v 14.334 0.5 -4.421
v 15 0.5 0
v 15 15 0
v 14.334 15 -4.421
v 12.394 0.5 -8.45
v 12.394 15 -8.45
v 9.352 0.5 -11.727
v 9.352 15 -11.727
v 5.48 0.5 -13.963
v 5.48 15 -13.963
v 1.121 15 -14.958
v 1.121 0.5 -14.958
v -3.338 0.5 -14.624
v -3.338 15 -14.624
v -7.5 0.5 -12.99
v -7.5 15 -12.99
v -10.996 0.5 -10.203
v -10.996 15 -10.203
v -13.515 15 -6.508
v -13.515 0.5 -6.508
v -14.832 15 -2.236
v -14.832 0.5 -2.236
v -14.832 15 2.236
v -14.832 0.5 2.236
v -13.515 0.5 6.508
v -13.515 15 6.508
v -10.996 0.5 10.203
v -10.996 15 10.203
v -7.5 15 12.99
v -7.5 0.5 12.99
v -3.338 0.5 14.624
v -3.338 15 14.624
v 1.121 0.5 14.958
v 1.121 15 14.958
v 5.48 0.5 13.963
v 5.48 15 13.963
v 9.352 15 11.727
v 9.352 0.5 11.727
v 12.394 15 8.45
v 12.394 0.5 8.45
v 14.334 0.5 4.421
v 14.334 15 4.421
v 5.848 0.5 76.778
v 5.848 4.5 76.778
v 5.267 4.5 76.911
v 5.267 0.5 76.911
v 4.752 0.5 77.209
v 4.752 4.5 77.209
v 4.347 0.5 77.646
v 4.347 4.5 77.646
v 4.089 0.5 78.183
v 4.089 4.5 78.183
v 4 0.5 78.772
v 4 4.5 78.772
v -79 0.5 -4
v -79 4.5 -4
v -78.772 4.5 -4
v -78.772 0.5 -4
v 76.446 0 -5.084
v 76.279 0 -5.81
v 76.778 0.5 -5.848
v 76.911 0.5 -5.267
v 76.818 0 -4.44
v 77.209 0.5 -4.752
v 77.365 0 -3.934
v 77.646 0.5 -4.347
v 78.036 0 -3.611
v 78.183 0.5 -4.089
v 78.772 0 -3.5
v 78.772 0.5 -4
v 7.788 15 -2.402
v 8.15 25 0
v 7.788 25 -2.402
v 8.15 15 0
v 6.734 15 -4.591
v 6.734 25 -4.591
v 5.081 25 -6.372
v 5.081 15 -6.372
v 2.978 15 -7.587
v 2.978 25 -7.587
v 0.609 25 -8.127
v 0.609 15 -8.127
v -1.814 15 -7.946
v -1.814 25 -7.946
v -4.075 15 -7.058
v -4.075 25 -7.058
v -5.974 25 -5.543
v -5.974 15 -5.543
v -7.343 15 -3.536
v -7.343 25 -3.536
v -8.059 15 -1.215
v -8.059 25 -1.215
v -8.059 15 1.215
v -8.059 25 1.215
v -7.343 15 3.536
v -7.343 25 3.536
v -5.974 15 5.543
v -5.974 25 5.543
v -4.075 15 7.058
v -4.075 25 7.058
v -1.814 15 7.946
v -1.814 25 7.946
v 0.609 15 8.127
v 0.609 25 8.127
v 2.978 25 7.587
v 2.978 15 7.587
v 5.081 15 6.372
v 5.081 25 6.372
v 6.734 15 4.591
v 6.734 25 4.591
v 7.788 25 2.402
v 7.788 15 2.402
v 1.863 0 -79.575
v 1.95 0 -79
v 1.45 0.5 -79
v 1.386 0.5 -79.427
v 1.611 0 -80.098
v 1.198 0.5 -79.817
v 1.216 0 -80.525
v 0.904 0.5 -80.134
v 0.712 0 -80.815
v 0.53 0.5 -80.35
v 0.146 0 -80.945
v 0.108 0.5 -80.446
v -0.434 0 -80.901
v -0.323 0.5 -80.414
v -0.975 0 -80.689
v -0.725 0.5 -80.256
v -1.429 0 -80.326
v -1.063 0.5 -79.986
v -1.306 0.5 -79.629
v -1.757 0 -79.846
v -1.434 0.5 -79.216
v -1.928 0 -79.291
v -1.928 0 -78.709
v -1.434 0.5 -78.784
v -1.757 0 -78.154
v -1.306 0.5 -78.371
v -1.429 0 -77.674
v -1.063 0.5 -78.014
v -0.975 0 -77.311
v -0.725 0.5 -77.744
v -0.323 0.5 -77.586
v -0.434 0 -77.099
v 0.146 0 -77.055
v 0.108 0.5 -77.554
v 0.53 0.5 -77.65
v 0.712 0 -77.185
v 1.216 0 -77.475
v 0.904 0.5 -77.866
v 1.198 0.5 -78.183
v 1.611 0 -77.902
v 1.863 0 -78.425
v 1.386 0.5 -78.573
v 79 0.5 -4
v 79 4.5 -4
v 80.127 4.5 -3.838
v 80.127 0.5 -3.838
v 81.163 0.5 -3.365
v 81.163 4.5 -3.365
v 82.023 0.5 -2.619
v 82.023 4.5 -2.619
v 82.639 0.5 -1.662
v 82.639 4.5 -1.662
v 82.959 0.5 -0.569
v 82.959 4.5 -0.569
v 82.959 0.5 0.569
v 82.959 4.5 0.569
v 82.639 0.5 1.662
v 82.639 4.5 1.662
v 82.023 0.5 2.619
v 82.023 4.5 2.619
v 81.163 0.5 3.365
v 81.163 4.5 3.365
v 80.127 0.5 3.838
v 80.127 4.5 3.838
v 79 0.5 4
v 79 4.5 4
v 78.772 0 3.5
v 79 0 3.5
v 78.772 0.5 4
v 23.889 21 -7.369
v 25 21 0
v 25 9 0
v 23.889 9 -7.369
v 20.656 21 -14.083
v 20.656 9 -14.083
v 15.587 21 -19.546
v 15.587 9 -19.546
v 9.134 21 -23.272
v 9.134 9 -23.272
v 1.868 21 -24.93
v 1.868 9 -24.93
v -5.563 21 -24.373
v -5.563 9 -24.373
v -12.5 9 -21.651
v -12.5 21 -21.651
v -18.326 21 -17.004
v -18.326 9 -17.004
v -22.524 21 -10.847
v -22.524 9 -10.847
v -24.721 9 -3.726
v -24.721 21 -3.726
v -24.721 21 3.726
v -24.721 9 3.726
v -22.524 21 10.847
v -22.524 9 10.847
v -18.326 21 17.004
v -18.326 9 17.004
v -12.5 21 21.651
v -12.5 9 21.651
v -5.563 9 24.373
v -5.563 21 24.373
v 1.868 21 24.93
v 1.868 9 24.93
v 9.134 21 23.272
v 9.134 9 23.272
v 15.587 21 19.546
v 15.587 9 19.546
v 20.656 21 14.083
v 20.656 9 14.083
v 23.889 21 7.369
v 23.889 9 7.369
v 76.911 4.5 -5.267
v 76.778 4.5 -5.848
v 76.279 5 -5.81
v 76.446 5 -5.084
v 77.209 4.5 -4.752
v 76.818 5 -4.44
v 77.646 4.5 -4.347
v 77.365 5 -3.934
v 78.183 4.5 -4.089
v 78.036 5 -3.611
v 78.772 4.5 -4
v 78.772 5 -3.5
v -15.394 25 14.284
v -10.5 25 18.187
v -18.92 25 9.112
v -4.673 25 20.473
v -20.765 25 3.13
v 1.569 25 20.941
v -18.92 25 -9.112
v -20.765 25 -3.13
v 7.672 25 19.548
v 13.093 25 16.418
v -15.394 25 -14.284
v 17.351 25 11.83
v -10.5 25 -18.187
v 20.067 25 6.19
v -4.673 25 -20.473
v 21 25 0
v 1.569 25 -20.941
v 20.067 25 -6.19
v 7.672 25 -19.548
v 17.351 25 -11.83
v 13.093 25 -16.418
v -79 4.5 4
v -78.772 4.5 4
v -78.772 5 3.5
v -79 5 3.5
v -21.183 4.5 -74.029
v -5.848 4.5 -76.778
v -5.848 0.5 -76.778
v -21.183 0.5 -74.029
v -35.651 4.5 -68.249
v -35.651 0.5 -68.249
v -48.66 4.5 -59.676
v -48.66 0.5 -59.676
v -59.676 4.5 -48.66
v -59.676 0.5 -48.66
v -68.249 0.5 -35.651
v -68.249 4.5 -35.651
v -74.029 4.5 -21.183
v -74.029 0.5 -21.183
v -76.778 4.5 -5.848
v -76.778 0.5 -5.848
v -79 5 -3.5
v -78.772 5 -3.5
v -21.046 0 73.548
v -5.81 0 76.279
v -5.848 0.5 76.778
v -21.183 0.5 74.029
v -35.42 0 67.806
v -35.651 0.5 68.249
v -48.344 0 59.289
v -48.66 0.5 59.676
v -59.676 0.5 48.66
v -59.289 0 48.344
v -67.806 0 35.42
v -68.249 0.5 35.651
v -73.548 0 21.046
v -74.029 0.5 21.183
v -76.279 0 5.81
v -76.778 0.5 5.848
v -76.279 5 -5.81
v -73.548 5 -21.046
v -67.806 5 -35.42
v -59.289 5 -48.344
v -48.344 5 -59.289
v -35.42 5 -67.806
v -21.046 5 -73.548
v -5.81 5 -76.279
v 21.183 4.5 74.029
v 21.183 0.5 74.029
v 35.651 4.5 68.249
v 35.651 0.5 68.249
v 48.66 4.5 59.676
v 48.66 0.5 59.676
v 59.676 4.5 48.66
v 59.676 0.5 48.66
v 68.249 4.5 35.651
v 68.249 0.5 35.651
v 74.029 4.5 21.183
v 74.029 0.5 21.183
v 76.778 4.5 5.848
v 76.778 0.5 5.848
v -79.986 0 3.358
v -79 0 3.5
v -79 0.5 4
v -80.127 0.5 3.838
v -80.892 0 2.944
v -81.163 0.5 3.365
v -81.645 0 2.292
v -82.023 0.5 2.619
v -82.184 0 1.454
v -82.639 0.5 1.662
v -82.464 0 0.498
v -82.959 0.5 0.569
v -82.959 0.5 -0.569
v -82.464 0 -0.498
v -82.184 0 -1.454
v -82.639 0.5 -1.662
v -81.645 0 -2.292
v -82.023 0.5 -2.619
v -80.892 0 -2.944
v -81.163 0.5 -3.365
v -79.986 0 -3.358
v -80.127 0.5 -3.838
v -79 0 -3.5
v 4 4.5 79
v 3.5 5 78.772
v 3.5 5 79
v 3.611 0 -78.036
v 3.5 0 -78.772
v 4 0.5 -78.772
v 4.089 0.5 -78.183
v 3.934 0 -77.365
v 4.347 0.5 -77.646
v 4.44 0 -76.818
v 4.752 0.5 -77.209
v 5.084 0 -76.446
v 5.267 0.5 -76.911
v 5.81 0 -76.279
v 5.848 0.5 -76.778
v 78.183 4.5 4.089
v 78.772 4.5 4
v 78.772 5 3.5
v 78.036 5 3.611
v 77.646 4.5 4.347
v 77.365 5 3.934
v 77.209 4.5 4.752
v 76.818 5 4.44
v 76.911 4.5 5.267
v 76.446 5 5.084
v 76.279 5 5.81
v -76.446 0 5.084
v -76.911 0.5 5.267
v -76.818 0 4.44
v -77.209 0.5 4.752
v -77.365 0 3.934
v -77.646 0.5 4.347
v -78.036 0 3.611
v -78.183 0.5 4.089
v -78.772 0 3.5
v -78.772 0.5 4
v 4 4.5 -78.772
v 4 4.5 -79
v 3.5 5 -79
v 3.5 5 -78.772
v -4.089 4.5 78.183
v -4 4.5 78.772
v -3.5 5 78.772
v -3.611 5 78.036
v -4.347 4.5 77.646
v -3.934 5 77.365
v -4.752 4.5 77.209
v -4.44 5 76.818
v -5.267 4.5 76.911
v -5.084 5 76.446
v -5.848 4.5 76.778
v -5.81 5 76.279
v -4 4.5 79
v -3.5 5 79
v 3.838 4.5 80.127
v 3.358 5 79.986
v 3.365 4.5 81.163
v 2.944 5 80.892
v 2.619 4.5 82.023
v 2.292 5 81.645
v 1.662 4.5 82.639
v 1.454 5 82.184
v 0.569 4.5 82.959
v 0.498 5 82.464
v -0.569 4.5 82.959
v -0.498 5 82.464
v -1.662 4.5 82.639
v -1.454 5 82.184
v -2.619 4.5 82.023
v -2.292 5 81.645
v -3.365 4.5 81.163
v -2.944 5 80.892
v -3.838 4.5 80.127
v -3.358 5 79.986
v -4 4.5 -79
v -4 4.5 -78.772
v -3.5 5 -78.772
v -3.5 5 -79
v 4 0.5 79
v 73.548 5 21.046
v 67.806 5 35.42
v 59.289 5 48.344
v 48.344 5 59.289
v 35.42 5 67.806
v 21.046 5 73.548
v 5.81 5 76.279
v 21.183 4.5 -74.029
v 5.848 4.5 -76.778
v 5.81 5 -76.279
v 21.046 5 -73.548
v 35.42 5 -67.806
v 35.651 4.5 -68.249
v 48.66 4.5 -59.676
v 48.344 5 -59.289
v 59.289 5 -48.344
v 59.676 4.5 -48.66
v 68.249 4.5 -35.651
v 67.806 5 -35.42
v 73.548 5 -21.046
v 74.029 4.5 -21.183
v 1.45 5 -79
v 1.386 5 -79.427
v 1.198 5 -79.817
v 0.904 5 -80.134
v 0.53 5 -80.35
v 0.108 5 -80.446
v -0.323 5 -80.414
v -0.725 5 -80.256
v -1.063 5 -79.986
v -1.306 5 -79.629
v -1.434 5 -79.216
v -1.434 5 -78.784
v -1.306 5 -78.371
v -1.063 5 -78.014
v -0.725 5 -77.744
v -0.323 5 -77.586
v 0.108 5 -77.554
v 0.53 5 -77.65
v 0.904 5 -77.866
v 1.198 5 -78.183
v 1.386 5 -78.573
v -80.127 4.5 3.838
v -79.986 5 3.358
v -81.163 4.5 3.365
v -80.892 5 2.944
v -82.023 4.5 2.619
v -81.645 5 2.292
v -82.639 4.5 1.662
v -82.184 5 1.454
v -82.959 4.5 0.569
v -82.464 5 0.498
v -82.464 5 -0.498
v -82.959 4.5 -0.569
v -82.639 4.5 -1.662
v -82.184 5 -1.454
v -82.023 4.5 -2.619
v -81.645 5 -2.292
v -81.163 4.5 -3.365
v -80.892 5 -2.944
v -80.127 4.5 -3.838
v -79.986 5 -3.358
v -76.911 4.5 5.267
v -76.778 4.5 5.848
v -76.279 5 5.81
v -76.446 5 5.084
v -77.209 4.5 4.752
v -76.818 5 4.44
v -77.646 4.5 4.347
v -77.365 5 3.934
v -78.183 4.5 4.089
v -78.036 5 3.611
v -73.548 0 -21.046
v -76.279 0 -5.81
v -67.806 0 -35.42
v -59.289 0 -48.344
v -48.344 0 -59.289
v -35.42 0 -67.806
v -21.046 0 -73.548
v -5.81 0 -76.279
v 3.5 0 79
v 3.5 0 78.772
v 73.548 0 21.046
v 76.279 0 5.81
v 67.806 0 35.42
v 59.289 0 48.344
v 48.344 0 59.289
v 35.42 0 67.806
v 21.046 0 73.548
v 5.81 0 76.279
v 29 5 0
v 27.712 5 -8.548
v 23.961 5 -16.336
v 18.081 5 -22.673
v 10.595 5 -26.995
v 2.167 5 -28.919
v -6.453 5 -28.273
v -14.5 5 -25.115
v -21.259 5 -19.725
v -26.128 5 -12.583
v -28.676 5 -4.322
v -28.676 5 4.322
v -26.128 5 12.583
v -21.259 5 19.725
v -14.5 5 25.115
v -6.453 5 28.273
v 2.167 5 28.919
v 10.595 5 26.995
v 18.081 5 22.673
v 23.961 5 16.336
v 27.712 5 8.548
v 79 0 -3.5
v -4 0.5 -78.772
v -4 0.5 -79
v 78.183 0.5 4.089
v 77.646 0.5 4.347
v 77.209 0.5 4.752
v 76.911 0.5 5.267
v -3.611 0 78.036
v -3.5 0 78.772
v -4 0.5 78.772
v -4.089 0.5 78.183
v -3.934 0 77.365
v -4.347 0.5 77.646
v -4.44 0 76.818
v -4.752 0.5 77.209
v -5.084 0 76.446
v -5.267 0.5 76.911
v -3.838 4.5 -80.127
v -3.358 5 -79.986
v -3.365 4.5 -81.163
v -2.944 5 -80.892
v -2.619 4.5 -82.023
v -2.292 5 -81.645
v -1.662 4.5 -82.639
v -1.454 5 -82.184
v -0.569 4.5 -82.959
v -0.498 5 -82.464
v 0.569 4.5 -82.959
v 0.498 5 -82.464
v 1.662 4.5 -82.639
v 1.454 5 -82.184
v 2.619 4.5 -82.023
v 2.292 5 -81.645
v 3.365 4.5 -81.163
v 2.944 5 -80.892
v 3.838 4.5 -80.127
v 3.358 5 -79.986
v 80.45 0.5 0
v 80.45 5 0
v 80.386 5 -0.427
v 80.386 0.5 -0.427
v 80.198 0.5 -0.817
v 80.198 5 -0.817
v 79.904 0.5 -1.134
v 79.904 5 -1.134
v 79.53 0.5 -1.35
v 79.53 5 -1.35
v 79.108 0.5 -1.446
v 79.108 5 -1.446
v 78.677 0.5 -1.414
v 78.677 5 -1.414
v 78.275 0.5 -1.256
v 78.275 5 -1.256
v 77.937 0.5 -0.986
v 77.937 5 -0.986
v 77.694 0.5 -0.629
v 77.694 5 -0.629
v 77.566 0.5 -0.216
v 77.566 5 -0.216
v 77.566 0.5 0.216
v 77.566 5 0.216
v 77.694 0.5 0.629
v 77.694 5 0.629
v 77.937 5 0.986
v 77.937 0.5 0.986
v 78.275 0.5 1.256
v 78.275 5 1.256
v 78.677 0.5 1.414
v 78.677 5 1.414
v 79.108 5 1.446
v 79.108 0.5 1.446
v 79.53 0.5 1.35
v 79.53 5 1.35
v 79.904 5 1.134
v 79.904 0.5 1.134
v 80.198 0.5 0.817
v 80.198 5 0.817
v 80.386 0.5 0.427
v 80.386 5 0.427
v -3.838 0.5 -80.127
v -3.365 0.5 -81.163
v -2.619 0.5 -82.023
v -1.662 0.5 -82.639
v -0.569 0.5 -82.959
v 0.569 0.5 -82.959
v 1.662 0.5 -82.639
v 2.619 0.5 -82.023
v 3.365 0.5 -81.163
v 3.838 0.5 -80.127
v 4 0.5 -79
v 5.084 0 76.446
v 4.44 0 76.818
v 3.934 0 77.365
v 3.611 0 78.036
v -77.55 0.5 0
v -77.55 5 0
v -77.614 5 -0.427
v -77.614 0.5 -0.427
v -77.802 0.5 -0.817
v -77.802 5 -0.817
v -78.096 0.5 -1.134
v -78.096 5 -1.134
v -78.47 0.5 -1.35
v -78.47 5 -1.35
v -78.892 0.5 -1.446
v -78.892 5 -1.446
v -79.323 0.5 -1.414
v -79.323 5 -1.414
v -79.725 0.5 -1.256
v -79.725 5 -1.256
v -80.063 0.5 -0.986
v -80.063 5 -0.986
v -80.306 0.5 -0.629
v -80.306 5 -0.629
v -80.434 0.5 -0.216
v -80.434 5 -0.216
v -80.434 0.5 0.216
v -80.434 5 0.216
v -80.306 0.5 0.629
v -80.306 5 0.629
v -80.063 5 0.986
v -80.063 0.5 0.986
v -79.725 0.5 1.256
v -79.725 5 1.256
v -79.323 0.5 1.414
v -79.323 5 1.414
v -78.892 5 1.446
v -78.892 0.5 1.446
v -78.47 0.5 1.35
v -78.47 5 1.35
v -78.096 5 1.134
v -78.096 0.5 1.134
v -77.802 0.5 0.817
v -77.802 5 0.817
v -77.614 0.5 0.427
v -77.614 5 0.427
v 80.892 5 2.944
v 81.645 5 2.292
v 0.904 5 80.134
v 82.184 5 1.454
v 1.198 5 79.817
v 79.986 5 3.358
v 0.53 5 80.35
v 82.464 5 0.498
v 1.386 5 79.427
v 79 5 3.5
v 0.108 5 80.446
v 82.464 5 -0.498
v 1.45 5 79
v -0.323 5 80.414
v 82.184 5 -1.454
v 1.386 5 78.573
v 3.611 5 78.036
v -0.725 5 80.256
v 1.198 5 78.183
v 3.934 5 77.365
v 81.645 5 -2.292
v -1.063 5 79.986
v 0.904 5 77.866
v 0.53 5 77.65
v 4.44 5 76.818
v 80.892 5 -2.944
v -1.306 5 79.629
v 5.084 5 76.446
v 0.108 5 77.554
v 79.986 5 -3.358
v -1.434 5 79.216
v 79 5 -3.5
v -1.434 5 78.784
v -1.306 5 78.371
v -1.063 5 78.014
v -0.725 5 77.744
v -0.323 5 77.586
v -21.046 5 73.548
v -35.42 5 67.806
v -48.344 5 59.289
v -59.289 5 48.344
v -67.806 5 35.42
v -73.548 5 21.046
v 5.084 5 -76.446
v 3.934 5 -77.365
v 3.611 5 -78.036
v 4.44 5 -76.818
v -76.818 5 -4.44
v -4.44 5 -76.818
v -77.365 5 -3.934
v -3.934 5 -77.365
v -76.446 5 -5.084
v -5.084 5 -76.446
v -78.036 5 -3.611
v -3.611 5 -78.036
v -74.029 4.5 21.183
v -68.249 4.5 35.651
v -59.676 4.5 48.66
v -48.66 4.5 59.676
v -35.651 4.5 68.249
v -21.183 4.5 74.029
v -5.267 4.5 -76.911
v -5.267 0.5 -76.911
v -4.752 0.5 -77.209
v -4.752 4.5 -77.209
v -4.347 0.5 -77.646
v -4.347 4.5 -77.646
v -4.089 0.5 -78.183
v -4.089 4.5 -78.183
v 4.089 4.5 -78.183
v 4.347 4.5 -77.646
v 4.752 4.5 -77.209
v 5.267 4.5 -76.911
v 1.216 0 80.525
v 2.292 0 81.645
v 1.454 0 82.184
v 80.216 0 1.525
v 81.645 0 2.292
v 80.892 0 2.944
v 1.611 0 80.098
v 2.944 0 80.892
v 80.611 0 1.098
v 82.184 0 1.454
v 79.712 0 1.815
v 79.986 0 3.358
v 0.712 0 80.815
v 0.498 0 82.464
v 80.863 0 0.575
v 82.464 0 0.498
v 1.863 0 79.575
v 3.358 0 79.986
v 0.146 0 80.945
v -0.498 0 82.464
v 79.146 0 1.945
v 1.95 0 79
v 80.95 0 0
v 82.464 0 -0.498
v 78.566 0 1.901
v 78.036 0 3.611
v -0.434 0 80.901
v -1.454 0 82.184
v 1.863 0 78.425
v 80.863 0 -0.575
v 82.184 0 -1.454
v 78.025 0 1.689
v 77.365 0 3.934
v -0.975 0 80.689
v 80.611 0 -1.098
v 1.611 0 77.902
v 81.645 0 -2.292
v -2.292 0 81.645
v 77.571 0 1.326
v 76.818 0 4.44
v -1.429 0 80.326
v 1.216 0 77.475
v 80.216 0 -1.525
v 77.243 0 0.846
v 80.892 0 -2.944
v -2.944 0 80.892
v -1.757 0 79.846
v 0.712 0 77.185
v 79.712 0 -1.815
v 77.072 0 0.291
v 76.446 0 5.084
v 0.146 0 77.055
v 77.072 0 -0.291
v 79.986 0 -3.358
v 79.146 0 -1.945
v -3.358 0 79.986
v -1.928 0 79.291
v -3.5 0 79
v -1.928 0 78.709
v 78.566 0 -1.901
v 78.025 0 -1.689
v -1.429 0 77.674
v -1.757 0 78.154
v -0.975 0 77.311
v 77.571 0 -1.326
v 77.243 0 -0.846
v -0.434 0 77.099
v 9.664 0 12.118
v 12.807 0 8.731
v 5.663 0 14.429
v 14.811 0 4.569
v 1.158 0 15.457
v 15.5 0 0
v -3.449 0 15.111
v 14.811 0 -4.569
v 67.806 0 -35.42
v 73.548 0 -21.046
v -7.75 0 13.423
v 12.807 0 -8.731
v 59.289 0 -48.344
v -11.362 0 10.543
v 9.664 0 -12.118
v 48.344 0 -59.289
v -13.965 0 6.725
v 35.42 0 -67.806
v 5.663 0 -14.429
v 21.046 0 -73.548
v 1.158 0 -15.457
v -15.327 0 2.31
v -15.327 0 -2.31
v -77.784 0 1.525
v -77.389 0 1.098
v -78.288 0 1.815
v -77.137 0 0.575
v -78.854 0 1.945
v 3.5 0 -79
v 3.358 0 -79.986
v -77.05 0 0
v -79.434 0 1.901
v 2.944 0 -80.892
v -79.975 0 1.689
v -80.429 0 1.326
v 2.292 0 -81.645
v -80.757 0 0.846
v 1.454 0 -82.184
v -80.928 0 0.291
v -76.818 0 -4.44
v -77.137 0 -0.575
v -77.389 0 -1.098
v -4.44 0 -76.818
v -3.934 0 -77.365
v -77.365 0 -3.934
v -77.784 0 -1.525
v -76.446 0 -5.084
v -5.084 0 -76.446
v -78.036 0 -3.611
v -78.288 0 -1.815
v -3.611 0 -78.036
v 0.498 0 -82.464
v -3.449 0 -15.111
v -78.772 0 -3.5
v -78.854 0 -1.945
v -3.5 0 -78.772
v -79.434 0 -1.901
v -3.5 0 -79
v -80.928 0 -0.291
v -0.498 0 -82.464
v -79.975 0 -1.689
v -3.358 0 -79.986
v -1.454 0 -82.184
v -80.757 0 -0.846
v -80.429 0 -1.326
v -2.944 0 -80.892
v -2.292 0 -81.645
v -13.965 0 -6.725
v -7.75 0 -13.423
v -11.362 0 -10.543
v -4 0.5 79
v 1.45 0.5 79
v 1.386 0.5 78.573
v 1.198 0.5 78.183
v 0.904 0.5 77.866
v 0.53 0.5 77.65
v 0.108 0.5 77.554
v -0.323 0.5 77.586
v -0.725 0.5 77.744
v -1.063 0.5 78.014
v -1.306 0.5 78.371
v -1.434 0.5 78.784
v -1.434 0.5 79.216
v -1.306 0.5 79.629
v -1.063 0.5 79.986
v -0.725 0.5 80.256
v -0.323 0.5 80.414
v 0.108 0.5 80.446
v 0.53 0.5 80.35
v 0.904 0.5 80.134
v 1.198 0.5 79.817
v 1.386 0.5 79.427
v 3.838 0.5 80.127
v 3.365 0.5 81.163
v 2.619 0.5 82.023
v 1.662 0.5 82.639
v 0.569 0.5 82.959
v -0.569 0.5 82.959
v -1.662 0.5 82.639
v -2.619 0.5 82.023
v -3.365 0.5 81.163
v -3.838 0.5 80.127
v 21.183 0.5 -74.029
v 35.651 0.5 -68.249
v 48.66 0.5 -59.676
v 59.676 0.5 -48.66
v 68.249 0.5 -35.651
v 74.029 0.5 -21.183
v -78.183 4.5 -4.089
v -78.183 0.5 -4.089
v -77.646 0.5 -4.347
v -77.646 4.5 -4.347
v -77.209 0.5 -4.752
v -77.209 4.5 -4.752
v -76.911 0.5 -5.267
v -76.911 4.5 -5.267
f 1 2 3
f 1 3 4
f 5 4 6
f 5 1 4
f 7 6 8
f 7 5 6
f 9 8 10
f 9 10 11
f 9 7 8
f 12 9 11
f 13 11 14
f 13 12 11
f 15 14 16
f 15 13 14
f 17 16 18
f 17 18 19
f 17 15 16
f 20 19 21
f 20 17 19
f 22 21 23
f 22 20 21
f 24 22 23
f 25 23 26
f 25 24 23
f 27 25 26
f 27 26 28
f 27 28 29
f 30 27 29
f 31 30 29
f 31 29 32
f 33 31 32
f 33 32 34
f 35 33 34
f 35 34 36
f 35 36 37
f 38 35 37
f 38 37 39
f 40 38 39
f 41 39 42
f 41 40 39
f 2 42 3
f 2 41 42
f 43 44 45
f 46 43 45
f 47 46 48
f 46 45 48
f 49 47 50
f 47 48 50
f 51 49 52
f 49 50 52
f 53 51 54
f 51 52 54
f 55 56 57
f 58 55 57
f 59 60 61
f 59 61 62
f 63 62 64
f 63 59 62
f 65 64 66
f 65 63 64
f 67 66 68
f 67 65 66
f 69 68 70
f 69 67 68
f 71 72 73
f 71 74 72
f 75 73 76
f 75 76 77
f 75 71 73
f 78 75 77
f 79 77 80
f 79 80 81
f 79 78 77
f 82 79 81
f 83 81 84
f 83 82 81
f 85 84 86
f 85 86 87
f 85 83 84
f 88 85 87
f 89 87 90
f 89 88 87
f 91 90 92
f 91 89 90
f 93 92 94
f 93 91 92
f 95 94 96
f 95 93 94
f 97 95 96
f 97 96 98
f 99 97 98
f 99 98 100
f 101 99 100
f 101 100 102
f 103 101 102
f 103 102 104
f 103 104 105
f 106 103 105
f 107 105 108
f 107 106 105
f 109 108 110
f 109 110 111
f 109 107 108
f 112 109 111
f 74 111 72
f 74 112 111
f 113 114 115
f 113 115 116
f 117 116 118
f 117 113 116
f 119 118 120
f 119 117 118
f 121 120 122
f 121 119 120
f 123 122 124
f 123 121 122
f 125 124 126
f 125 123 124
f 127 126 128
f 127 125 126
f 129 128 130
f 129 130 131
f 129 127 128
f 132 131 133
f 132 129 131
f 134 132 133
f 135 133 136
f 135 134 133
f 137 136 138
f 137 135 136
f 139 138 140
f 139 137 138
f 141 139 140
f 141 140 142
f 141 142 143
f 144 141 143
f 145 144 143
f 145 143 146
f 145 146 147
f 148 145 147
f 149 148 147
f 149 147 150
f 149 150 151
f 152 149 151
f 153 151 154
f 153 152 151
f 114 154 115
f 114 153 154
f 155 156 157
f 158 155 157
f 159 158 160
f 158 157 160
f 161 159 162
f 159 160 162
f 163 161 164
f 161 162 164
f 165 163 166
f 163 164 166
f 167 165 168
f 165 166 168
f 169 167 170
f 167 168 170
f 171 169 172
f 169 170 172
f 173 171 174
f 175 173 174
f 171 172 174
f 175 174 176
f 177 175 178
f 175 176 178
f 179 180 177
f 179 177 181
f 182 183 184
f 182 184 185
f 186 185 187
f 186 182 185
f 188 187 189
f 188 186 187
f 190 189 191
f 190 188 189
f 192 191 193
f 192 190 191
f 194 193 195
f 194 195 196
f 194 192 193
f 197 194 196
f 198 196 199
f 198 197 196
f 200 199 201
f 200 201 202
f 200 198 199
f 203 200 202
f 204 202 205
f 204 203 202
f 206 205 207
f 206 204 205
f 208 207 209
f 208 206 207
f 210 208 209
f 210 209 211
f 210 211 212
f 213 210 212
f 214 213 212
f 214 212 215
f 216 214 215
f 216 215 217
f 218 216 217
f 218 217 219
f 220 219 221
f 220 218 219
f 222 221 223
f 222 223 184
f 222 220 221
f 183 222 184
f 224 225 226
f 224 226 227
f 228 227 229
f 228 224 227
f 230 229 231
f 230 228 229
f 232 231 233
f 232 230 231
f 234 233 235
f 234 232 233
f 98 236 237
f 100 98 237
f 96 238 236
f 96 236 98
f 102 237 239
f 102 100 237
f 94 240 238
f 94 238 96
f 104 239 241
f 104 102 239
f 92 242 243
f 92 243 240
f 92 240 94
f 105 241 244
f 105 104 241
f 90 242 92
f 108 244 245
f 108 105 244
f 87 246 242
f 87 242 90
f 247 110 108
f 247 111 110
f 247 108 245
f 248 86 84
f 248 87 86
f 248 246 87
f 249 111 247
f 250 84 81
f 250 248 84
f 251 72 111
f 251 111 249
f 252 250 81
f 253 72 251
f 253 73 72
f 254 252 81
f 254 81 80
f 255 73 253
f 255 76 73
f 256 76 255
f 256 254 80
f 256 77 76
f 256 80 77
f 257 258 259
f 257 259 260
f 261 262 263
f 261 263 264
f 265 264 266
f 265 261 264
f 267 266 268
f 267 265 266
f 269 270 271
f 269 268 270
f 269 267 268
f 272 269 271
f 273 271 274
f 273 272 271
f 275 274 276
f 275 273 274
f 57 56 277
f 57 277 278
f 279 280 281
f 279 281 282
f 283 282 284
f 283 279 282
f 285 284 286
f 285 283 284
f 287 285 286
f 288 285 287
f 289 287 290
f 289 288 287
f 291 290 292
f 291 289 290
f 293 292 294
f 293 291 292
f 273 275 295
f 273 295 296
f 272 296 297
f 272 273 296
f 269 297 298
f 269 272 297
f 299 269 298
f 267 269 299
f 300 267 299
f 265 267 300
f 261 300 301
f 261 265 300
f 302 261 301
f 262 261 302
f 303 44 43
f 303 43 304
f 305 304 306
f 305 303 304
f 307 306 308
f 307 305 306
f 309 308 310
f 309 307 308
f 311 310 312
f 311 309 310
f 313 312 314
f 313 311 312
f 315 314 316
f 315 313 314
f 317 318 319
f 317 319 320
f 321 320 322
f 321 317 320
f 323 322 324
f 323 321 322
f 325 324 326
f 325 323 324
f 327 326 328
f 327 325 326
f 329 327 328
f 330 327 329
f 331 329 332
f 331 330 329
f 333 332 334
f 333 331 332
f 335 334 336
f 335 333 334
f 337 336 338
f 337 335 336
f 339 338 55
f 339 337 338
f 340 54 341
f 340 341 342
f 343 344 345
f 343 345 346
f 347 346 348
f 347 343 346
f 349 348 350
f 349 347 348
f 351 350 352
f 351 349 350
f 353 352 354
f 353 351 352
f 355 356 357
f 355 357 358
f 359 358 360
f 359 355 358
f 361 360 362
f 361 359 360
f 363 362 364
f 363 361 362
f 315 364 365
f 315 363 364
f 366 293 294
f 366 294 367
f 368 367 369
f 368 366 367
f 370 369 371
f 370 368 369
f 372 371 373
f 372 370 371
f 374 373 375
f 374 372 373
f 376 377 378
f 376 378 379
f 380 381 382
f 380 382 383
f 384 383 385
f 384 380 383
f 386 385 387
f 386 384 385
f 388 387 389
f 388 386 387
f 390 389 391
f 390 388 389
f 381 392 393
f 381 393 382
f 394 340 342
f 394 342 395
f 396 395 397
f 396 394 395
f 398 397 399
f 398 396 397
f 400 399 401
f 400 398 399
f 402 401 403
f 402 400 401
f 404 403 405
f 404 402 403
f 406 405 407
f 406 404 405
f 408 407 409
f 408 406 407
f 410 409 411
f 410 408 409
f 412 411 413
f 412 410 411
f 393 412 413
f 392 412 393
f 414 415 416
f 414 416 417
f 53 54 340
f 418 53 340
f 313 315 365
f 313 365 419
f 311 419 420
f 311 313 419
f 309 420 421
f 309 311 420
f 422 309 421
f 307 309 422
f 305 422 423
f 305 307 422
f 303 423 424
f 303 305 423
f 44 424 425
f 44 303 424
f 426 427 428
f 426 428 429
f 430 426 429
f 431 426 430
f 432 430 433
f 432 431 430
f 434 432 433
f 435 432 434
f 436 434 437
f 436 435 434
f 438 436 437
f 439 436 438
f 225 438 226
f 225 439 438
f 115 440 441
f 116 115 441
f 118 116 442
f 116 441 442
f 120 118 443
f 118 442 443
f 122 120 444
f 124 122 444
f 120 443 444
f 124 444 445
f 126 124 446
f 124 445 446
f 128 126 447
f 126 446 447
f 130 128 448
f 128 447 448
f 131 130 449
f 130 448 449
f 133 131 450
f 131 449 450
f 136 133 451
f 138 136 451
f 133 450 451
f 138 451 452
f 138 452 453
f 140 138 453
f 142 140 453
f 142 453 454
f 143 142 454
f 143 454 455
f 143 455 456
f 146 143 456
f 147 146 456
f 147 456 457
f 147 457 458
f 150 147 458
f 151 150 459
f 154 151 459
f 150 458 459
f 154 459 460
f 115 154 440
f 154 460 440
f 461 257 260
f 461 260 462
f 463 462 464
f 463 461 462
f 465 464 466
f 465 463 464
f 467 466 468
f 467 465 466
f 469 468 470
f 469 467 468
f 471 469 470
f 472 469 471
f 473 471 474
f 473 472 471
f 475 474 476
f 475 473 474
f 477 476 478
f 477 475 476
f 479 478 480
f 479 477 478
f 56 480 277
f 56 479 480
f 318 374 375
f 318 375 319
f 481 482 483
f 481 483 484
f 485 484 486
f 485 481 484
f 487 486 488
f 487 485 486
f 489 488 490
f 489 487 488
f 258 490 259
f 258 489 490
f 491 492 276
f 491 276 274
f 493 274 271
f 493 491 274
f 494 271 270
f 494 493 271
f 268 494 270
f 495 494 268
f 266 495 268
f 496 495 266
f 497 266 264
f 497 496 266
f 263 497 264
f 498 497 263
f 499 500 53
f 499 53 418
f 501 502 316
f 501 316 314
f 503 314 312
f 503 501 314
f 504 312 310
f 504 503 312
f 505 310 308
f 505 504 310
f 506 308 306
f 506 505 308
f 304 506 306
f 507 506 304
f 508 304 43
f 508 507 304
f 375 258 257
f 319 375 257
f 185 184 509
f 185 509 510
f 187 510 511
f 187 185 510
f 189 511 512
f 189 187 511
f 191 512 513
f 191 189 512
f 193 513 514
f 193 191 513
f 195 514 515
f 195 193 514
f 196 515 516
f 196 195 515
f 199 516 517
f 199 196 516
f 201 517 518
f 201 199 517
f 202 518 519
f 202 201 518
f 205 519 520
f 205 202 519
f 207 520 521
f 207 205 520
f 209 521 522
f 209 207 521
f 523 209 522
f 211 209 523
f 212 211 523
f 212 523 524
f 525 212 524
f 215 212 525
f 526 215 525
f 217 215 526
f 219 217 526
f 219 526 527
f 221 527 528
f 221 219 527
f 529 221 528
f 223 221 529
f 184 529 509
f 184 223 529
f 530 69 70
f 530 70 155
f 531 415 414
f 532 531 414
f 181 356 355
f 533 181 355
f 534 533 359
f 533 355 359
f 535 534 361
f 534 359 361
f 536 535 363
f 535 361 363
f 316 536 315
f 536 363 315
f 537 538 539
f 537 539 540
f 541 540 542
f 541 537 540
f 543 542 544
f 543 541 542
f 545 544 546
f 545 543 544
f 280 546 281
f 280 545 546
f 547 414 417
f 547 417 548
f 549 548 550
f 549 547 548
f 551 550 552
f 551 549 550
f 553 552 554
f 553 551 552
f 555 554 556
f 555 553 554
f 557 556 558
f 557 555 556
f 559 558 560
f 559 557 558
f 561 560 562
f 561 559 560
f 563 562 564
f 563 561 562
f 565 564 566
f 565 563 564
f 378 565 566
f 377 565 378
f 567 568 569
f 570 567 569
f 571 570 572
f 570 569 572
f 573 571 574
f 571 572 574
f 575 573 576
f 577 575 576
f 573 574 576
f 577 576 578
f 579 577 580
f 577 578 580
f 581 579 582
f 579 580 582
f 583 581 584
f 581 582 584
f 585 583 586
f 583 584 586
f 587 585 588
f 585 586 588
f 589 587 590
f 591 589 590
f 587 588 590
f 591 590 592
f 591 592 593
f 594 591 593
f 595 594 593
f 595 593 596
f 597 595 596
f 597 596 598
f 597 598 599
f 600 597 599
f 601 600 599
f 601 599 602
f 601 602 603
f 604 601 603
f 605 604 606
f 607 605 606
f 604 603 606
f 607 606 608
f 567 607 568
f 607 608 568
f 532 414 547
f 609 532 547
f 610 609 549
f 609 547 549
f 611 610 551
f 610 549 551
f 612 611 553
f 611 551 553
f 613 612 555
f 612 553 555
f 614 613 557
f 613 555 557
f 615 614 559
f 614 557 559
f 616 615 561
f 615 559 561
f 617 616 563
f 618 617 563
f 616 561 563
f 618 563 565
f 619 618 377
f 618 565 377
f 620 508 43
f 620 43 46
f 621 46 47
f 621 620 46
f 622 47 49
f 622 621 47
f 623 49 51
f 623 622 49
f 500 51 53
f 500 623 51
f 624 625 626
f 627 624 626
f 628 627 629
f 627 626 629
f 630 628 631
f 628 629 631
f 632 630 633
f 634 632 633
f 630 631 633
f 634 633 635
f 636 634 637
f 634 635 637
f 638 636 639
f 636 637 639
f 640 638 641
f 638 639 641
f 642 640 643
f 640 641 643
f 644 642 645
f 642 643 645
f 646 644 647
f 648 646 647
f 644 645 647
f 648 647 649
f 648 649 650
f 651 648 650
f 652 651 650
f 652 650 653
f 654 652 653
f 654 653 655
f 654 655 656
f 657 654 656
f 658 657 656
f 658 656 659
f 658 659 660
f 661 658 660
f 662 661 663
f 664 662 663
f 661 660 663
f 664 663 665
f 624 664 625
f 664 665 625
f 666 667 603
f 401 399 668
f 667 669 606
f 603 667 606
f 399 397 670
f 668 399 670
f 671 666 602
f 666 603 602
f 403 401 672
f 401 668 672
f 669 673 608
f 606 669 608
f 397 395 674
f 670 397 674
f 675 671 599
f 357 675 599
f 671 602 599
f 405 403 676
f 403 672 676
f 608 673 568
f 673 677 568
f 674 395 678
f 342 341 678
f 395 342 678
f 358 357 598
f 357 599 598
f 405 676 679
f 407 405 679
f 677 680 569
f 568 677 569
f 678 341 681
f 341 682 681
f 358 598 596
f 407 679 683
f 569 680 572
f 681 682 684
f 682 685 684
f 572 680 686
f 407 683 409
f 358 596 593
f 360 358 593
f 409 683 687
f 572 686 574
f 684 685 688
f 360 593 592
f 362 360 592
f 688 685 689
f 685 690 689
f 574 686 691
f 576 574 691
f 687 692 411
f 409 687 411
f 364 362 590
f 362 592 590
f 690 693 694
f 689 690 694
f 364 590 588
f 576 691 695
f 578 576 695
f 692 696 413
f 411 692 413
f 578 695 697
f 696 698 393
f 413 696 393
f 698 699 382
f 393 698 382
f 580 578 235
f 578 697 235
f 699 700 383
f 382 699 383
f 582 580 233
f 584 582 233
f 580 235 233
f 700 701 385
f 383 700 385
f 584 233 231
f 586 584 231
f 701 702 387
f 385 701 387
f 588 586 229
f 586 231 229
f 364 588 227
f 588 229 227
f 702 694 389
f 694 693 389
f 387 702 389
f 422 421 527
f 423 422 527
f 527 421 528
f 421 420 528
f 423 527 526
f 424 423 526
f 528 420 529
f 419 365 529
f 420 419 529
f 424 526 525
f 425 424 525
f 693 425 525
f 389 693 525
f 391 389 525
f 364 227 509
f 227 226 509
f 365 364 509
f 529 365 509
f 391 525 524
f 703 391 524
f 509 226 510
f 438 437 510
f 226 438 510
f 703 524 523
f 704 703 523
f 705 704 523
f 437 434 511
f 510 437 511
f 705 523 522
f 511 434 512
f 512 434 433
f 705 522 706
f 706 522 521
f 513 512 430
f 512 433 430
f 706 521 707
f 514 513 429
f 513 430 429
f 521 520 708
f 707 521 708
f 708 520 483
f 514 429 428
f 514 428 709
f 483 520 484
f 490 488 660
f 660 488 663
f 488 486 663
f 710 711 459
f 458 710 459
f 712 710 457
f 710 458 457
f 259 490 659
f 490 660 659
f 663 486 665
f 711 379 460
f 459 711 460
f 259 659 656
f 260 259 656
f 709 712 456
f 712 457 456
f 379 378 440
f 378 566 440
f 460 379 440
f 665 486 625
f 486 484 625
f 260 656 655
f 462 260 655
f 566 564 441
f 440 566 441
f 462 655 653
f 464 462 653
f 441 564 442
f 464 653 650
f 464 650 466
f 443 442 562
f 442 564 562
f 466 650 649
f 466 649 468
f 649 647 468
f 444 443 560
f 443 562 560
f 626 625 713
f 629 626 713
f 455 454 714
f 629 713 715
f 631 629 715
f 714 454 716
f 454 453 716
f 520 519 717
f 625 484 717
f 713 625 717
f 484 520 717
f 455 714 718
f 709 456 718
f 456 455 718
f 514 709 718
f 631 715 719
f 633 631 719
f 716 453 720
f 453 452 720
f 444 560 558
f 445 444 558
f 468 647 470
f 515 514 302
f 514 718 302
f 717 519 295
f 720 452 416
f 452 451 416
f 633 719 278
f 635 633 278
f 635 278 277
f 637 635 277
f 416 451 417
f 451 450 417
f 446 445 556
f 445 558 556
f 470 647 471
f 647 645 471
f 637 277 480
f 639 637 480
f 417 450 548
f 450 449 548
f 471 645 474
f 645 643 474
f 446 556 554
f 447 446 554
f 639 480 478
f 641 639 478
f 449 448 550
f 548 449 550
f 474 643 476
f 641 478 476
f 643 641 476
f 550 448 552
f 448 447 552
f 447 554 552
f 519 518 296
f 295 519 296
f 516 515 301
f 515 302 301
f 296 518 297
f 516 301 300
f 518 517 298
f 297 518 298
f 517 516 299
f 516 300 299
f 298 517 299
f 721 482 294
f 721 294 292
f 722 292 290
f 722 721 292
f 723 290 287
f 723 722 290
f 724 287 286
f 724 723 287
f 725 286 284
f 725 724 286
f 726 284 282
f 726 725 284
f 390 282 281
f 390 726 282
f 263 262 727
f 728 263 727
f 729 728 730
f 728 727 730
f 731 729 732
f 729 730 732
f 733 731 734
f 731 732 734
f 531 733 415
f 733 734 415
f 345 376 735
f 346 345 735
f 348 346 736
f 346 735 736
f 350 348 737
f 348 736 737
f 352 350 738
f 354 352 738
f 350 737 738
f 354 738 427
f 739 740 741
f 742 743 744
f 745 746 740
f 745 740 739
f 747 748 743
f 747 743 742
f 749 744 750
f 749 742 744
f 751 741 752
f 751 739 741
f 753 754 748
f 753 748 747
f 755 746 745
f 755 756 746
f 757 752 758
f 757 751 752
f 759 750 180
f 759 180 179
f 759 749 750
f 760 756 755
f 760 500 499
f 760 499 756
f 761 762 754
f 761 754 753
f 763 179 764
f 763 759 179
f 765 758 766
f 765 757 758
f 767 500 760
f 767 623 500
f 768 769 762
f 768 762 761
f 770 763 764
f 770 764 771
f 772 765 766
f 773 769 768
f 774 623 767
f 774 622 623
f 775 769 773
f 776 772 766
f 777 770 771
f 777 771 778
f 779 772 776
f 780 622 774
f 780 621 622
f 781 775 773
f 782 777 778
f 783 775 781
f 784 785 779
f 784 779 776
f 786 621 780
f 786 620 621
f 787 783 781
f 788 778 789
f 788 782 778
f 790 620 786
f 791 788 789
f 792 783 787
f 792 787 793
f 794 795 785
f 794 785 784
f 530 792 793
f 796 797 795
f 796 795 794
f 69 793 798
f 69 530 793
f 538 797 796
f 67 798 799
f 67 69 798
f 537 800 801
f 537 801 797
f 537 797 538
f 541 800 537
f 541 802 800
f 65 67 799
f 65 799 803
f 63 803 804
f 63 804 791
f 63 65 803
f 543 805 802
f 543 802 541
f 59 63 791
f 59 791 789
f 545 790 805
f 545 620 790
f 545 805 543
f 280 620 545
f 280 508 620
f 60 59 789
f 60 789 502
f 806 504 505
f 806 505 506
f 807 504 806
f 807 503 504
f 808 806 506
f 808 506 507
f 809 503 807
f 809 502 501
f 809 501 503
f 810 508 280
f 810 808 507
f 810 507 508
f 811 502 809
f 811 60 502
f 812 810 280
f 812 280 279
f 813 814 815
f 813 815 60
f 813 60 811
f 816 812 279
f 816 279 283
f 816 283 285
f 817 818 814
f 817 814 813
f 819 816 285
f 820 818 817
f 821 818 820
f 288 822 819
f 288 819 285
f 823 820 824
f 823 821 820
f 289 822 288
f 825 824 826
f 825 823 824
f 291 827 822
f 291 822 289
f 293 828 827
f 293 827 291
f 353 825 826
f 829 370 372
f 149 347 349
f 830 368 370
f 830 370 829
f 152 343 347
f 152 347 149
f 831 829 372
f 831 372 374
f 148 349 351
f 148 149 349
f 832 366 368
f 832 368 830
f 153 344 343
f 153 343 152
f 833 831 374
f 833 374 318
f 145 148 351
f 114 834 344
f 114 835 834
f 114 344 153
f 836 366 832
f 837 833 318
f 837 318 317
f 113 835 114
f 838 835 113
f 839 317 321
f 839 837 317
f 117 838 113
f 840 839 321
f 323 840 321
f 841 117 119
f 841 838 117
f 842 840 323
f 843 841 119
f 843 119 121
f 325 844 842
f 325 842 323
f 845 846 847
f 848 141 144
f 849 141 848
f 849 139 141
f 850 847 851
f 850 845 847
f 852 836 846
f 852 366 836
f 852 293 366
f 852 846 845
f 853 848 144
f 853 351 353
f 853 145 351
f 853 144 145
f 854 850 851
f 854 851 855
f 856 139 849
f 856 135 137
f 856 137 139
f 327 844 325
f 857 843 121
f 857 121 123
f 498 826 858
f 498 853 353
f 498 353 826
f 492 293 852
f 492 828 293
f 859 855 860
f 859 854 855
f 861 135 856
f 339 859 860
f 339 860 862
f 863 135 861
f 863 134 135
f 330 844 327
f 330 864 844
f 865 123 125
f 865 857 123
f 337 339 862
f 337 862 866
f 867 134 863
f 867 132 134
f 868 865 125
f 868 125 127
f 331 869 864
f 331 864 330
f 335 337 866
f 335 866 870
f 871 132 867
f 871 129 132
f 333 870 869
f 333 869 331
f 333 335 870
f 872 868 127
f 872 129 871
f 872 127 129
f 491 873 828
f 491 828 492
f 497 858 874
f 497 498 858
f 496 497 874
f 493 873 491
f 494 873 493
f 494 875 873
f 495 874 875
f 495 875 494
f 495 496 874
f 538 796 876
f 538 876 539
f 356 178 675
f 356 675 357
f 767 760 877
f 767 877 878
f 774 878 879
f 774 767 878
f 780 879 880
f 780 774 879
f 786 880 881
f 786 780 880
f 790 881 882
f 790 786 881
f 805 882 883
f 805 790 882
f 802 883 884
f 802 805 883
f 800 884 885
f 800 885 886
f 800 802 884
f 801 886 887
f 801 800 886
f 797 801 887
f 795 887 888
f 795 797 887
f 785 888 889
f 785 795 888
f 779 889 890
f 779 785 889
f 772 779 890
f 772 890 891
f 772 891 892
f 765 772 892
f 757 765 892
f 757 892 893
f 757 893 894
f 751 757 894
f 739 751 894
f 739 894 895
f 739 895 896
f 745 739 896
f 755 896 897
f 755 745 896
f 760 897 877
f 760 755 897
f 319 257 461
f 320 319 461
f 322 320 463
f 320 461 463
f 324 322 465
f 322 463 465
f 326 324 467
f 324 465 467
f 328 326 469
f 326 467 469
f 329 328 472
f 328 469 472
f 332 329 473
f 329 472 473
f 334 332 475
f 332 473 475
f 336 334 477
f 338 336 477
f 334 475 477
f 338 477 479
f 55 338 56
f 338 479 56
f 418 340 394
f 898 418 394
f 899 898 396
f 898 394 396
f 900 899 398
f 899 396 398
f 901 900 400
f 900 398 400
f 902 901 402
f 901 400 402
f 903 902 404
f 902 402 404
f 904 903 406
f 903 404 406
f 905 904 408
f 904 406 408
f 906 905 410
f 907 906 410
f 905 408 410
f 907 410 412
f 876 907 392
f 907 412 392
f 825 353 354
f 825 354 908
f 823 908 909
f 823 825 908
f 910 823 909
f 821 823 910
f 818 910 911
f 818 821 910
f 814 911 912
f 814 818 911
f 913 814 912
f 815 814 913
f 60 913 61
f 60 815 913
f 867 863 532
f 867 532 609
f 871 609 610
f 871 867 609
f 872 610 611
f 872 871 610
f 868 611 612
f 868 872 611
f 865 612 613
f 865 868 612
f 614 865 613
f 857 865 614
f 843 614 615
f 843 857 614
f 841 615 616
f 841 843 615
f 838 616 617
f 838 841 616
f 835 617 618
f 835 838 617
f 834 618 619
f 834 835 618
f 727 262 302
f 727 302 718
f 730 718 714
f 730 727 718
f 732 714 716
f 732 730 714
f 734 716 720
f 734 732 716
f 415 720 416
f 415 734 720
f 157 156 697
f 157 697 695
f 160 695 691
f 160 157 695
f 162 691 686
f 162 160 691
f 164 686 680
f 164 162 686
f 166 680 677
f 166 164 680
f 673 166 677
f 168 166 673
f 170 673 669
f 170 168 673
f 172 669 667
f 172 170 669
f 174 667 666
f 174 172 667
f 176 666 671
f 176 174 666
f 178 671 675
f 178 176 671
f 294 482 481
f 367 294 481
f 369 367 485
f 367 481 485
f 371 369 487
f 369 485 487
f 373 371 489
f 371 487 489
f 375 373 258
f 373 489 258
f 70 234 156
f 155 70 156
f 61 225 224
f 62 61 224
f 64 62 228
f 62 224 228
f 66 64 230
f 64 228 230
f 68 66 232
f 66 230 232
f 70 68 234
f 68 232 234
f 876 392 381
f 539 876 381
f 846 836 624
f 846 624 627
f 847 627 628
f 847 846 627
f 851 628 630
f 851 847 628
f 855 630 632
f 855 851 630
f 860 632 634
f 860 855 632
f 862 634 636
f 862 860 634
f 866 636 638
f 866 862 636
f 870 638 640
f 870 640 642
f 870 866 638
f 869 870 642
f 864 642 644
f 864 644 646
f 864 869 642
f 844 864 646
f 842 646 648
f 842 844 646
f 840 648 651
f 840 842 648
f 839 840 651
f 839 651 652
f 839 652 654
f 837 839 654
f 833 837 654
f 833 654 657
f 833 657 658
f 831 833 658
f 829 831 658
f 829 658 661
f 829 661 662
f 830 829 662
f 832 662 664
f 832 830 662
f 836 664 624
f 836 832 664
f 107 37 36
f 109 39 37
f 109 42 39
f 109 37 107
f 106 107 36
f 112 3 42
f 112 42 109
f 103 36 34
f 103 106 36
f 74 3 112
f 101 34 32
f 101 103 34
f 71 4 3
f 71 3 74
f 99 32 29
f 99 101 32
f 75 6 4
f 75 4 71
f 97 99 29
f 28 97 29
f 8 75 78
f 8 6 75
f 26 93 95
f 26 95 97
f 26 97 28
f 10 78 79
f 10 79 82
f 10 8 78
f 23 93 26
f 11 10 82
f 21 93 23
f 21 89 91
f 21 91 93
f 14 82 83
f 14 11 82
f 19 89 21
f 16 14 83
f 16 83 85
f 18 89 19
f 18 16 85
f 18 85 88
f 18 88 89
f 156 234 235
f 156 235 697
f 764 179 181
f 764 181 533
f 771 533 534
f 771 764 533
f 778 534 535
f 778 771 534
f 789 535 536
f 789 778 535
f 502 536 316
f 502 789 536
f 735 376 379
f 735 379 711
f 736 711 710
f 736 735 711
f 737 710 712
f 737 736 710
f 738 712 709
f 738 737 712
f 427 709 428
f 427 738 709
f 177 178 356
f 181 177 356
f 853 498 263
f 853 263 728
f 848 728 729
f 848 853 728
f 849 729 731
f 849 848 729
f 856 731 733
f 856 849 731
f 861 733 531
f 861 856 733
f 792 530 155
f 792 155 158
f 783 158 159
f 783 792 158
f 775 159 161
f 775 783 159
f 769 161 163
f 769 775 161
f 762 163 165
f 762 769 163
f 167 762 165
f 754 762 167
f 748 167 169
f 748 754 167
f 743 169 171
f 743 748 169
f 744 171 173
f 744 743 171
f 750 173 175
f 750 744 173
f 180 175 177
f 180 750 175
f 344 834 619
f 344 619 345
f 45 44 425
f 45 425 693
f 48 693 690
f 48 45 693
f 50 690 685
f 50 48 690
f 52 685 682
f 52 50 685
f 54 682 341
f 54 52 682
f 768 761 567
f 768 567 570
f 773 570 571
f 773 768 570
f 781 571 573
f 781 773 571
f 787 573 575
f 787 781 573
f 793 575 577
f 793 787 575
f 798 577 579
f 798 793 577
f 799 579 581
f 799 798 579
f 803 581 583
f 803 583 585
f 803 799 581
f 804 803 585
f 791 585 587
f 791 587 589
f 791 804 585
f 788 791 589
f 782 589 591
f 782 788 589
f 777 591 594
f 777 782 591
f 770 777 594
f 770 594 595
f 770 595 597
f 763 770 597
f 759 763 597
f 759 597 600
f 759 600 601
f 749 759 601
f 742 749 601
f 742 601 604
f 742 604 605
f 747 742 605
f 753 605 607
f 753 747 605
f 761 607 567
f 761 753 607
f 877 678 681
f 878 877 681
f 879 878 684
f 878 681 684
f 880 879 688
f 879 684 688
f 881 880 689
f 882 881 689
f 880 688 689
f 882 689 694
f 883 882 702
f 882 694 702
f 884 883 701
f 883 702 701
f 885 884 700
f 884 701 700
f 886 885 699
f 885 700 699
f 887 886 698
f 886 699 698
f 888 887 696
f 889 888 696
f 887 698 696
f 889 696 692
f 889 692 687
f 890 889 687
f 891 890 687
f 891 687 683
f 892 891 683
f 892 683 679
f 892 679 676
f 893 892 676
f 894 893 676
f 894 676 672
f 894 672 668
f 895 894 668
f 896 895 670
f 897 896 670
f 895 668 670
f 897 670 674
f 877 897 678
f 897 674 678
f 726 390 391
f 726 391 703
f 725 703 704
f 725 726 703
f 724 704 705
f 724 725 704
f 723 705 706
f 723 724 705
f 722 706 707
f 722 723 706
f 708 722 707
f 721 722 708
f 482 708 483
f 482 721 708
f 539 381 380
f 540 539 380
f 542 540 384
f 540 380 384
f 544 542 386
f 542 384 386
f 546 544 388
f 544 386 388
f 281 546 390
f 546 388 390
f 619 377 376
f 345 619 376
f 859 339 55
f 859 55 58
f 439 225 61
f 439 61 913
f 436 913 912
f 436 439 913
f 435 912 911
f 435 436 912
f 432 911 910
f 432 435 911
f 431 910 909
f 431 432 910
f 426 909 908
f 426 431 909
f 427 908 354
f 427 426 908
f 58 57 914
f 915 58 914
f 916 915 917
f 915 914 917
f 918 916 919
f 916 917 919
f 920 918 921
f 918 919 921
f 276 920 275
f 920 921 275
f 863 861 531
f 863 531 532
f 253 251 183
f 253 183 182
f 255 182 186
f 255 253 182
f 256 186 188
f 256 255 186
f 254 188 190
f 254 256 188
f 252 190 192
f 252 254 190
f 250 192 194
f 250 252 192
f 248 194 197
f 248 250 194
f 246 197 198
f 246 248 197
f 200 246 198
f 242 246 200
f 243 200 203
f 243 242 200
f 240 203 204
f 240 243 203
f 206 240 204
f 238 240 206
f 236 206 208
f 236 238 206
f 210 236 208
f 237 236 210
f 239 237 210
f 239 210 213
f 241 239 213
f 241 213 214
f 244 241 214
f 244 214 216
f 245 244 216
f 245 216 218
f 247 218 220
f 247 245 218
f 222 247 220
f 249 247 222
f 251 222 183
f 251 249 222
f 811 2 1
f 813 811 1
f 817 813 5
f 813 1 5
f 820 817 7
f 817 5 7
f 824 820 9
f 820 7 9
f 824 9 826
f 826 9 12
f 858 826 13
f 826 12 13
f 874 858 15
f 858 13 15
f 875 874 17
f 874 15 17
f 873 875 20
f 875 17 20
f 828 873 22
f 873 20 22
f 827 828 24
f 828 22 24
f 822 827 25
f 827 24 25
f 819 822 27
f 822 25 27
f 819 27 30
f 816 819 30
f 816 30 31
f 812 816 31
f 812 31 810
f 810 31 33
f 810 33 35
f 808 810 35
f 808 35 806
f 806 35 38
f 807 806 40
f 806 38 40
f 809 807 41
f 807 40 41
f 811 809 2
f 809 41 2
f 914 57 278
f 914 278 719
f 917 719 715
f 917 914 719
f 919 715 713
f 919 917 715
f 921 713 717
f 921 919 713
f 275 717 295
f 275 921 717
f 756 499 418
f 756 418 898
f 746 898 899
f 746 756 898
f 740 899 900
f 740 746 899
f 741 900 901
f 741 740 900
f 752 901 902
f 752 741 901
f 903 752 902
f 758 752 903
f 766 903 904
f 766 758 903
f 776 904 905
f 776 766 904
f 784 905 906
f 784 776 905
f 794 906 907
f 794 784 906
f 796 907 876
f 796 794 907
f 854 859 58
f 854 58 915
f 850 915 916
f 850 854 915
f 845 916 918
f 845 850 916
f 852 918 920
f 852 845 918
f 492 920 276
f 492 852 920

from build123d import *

# Parameters (mm, degrees)
SZKIC2_W                    = 62
SZKIC2_H                    = 5
SZKIC3_R                    = 1.45
DODANIE_WYCI_GNI_CIE1_DEPTH = 5
SFAZOWANIE1_SIZE            = 4
ZAOKR_GLENIE1_R             = 2
SFAZOWANIE2_SIZE            = 0.5


with BuildPart() as part:
    # Szkic2 → Obrót1 (revolve)
    with BuildSketch(Plane.XY):
        Polygon((15, 15), (15, 5), (25, 5), (25, 25), (8.15, 25), (8.15, 15), align=None)
        with Locations((46, 2.5)):
            Rectangle(SZKIC2_W, SZKIC2_H)
    revolve(axis=Axis((0, 0, 0), (0, 1, 0)))

    # Szkic3 → Dodanie-wyciągnięcie1 (add)
    with BuildSketch(Plane(origin=(0, 5, 0), x_dir=(1, 0, 0), z_dir=(0, 1, 0))):
        with BuildLine():
            Line((-4, 76.5), (-4, 79))
            ThreePointArc((-4, 79), (0, 83), (4, 79))
            Line((4, 79), (4, 76.5))
            ThreePointArc((4, 76.5), (0, 72.5), (-4, 76.5))
        make_face()
        with Locations((0, 79)):
            Circle(SZKIC3_R, mode=Mode.SUBTRACT)
        with BuildLine():
            Line((76.5, 4), (79, 4))
            ThreePointArc((79, 4), (83, 0), (79, -4))
            Line((79, -4), (76.5, -4))
            ThreePointArc((76.5, -4), (72.5, 0), (76.5, 4))
        make_face()
        with Locations((79, 0)):
            Circle(SZKIC3_R, mode=Mode.SUBTRACT)
        with BuildLine():
            Line((4, -76.5), (4, -79))
            ThreePointArc((4, -79), (0, -83), (-4, -79))
            Line((-4, -79), (-4, -76.5))
            ThreePointArc((-4, -76.5), (0, -72.5), (4, -76.5))
        make_face()
        with Locations((0, -79)):
            Circle(SZKIC3_R, mode=Mode.SUBTRACT)
        with BuildLine():
            Line((-76.5, -4), (-79, -4))
            ThreePointArc((-79, -4), (-83, 0), (-79, 4))
            Line((-79, 4), (-76.5, 4))
            ThreePointArc((-76.5, 4), (-72.5, 0), (-76.5, -4))
        make_face()
        with Locations((-79, 0)):
            Circle(SZKIC3_R, mode=Mode.SUBTRACT)
    extrude(amount=-DODANIE_WYCI_GNI_CIE1_DEPTH)

    # Sfazowanie1
    sfazowanie1_edges = [part.edges().sort_by_distance(p)[0] for p in [
        (-25, 25, 0),
        (-25, 5, 0),
    ]]
    chamfer(sfazowanie1_edges, length=SFAZOWANIE1_SIZE)

    # Zaokrąglenie1
    zaokr_glenie1_edges = [part.edges().sort_by_distance(p)[0] for p in [
        (-76.896033708, 2.5, -4),
        (-76.896033708, 2.5, 4),
        (-4, 2.5, 76.896033708),
        (4, 2.5, 76.896033708),
        (76.896033708, 2.5, 4),
        (76.896033708, 2.5, -4),
        (4, 2.5, -76.896033708),
        (-4, 2.5, -76.896033708),
    ]]
    fillet(zaokr_glenie1_edges, radius=ZAOKR_GLENIE1_R)

    # Sfazowanie2
    sfazowanie2_edges = [part.edges().sort_by_distance(p)[0] for p in [
        (4, 5, -78.885911187),
        (4, 0, -78.885911187),
        (-4, 5, -78.885911187),
        (-4, 0, -78.885911187),
        (77.41237349, 5, 4.53306485),
        (77.41237349, 0, 4.53306485),
        (77.41237349, 5, -4.53306485),
        (77.41237349, 0, -4.53306485),
        (4.53306485, 5, 77.41237349),
        (4.53306485, 0, 77.41237349),
        (-4.53306485, 5, 77.41237349),
        (-4.53306485, 0, 77.41237349),
        (-77.41237349, 5, 4.53306485),
        (-77.41237349, 0, 4.53306485),
        (-77.41237349, 5, -4.53306485),
        (-77.41237349, 0, -4.53306485),
        (4.53306485, 5, -77.41237349),
        (4.53306485, 0, -77.41237349),
        (-4.53306485, 5, -77.41237349),
        (-4.53306485, 0, -77.41237349),
        (-83, 0, 0),
        (-80.45, 0, 0),
        (-83, 5, 0),
        (0, 0, 83),
        (-1.45, 0, 79),
        (0, 5, 83),
        (83, 0, 0),
        (77.55, 0, 0),
        (83, 5, 0),
        (0, 0, -83),
        (-1.45, 0, -79),
        (0, 5, -83),
        (-15, 0, 0),
        (54.447222151, 5, 54.447222151),
        (54.447222151, 0, 54.447222151),
        (78.885911187, 5, 4),
        (78.885911187, 0, 4),
        (78.885911187, 5, -4),
        (78.885911187, 0, -4),
        (54.447222151, 5, -54.447222151),
        (54.447222151, 0, -54.447222151),
        (4, 5, 78.885911187),
        (4, 0, 78.885911187),
        (-54.447222151, 5, 54.447222151),
        (-54.447222151, 0, 54.447222151),
        (-4, 5, 78.885911187),
        (-4, 0, 78.885911187),
        (-78.885911187, 5, 4),
        (-78.885911187, 0, 4),
        (-54.447222151, 5, -54.447222151),
        (-54.447222151, 0, -54.447222151),
        (-78.885911187, 5, -4),
        (-78.885911187, 0, -4),
    ]]
    chamfer(sfazowanie2_edges, length=SFAZOWANIE2_SIZE)


solid = part.part
